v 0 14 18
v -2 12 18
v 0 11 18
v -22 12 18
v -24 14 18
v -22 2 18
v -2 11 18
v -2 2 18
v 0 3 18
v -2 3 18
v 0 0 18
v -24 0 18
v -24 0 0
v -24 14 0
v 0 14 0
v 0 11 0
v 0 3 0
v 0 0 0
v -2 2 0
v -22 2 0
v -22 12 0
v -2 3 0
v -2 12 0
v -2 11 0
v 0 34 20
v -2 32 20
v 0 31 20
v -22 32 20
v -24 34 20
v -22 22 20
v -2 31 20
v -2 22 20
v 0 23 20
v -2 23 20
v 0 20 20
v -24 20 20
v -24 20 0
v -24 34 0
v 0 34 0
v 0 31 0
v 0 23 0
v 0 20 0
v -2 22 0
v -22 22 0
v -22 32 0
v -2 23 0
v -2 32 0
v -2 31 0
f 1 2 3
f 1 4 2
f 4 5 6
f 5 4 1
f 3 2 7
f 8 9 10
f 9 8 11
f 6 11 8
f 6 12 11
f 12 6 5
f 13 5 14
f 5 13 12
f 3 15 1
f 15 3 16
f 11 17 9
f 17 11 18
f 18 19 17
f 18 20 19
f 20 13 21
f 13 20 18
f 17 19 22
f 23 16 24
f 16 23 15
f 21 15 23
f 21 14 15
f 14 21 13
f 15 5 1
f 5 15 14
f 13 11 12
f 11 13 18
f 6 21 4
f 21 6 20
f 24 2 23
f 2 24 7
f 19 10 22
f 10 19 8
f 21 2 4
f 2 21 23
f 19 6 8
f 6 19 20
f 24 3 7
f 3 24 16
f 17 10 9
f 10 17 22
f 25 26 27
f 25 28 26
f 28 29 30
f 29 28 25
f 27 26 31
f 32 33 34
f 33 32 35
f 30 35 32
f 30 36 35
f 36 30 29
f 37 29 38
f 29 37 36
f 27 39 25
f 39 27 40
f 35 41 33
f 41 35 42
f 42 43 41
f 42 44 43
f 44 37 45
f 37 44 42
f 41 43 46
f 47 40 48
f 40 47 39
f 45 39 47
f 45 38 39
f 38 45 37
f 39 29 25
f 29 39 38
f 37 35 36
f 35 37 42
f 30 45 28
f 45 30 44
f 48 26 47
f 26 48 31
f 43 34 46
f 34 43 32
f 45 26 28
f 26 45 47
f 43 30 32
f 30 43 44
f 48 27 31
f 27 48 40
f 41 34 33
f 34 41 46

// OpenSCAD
// ****************************************************************************
// Arm cover, can be used to fix the cables in the arm
// resize as required
// Author: Peter Holzwarth
// ****************************************************************************

// length of one arm
len1= 18; // [5:180]

// length of other arm
len2= 20; // [5:180]

rotate([0,-90,0]) cover(len1);
translate([0, 20, 0]) rotate([0,-90,0]) cover(len2);

// an arm cover, 20mm wide
module cover(width) {
    difference() {
        cube([width,14,20+4]);
        // inner part
        translate([-0.1, 2, 2]) cube([width+0.2,10,20]);
        // snapping part
        translate([-0.1, 3, -0.1]) cube([width+.2,8,2.2]);
    }
}
